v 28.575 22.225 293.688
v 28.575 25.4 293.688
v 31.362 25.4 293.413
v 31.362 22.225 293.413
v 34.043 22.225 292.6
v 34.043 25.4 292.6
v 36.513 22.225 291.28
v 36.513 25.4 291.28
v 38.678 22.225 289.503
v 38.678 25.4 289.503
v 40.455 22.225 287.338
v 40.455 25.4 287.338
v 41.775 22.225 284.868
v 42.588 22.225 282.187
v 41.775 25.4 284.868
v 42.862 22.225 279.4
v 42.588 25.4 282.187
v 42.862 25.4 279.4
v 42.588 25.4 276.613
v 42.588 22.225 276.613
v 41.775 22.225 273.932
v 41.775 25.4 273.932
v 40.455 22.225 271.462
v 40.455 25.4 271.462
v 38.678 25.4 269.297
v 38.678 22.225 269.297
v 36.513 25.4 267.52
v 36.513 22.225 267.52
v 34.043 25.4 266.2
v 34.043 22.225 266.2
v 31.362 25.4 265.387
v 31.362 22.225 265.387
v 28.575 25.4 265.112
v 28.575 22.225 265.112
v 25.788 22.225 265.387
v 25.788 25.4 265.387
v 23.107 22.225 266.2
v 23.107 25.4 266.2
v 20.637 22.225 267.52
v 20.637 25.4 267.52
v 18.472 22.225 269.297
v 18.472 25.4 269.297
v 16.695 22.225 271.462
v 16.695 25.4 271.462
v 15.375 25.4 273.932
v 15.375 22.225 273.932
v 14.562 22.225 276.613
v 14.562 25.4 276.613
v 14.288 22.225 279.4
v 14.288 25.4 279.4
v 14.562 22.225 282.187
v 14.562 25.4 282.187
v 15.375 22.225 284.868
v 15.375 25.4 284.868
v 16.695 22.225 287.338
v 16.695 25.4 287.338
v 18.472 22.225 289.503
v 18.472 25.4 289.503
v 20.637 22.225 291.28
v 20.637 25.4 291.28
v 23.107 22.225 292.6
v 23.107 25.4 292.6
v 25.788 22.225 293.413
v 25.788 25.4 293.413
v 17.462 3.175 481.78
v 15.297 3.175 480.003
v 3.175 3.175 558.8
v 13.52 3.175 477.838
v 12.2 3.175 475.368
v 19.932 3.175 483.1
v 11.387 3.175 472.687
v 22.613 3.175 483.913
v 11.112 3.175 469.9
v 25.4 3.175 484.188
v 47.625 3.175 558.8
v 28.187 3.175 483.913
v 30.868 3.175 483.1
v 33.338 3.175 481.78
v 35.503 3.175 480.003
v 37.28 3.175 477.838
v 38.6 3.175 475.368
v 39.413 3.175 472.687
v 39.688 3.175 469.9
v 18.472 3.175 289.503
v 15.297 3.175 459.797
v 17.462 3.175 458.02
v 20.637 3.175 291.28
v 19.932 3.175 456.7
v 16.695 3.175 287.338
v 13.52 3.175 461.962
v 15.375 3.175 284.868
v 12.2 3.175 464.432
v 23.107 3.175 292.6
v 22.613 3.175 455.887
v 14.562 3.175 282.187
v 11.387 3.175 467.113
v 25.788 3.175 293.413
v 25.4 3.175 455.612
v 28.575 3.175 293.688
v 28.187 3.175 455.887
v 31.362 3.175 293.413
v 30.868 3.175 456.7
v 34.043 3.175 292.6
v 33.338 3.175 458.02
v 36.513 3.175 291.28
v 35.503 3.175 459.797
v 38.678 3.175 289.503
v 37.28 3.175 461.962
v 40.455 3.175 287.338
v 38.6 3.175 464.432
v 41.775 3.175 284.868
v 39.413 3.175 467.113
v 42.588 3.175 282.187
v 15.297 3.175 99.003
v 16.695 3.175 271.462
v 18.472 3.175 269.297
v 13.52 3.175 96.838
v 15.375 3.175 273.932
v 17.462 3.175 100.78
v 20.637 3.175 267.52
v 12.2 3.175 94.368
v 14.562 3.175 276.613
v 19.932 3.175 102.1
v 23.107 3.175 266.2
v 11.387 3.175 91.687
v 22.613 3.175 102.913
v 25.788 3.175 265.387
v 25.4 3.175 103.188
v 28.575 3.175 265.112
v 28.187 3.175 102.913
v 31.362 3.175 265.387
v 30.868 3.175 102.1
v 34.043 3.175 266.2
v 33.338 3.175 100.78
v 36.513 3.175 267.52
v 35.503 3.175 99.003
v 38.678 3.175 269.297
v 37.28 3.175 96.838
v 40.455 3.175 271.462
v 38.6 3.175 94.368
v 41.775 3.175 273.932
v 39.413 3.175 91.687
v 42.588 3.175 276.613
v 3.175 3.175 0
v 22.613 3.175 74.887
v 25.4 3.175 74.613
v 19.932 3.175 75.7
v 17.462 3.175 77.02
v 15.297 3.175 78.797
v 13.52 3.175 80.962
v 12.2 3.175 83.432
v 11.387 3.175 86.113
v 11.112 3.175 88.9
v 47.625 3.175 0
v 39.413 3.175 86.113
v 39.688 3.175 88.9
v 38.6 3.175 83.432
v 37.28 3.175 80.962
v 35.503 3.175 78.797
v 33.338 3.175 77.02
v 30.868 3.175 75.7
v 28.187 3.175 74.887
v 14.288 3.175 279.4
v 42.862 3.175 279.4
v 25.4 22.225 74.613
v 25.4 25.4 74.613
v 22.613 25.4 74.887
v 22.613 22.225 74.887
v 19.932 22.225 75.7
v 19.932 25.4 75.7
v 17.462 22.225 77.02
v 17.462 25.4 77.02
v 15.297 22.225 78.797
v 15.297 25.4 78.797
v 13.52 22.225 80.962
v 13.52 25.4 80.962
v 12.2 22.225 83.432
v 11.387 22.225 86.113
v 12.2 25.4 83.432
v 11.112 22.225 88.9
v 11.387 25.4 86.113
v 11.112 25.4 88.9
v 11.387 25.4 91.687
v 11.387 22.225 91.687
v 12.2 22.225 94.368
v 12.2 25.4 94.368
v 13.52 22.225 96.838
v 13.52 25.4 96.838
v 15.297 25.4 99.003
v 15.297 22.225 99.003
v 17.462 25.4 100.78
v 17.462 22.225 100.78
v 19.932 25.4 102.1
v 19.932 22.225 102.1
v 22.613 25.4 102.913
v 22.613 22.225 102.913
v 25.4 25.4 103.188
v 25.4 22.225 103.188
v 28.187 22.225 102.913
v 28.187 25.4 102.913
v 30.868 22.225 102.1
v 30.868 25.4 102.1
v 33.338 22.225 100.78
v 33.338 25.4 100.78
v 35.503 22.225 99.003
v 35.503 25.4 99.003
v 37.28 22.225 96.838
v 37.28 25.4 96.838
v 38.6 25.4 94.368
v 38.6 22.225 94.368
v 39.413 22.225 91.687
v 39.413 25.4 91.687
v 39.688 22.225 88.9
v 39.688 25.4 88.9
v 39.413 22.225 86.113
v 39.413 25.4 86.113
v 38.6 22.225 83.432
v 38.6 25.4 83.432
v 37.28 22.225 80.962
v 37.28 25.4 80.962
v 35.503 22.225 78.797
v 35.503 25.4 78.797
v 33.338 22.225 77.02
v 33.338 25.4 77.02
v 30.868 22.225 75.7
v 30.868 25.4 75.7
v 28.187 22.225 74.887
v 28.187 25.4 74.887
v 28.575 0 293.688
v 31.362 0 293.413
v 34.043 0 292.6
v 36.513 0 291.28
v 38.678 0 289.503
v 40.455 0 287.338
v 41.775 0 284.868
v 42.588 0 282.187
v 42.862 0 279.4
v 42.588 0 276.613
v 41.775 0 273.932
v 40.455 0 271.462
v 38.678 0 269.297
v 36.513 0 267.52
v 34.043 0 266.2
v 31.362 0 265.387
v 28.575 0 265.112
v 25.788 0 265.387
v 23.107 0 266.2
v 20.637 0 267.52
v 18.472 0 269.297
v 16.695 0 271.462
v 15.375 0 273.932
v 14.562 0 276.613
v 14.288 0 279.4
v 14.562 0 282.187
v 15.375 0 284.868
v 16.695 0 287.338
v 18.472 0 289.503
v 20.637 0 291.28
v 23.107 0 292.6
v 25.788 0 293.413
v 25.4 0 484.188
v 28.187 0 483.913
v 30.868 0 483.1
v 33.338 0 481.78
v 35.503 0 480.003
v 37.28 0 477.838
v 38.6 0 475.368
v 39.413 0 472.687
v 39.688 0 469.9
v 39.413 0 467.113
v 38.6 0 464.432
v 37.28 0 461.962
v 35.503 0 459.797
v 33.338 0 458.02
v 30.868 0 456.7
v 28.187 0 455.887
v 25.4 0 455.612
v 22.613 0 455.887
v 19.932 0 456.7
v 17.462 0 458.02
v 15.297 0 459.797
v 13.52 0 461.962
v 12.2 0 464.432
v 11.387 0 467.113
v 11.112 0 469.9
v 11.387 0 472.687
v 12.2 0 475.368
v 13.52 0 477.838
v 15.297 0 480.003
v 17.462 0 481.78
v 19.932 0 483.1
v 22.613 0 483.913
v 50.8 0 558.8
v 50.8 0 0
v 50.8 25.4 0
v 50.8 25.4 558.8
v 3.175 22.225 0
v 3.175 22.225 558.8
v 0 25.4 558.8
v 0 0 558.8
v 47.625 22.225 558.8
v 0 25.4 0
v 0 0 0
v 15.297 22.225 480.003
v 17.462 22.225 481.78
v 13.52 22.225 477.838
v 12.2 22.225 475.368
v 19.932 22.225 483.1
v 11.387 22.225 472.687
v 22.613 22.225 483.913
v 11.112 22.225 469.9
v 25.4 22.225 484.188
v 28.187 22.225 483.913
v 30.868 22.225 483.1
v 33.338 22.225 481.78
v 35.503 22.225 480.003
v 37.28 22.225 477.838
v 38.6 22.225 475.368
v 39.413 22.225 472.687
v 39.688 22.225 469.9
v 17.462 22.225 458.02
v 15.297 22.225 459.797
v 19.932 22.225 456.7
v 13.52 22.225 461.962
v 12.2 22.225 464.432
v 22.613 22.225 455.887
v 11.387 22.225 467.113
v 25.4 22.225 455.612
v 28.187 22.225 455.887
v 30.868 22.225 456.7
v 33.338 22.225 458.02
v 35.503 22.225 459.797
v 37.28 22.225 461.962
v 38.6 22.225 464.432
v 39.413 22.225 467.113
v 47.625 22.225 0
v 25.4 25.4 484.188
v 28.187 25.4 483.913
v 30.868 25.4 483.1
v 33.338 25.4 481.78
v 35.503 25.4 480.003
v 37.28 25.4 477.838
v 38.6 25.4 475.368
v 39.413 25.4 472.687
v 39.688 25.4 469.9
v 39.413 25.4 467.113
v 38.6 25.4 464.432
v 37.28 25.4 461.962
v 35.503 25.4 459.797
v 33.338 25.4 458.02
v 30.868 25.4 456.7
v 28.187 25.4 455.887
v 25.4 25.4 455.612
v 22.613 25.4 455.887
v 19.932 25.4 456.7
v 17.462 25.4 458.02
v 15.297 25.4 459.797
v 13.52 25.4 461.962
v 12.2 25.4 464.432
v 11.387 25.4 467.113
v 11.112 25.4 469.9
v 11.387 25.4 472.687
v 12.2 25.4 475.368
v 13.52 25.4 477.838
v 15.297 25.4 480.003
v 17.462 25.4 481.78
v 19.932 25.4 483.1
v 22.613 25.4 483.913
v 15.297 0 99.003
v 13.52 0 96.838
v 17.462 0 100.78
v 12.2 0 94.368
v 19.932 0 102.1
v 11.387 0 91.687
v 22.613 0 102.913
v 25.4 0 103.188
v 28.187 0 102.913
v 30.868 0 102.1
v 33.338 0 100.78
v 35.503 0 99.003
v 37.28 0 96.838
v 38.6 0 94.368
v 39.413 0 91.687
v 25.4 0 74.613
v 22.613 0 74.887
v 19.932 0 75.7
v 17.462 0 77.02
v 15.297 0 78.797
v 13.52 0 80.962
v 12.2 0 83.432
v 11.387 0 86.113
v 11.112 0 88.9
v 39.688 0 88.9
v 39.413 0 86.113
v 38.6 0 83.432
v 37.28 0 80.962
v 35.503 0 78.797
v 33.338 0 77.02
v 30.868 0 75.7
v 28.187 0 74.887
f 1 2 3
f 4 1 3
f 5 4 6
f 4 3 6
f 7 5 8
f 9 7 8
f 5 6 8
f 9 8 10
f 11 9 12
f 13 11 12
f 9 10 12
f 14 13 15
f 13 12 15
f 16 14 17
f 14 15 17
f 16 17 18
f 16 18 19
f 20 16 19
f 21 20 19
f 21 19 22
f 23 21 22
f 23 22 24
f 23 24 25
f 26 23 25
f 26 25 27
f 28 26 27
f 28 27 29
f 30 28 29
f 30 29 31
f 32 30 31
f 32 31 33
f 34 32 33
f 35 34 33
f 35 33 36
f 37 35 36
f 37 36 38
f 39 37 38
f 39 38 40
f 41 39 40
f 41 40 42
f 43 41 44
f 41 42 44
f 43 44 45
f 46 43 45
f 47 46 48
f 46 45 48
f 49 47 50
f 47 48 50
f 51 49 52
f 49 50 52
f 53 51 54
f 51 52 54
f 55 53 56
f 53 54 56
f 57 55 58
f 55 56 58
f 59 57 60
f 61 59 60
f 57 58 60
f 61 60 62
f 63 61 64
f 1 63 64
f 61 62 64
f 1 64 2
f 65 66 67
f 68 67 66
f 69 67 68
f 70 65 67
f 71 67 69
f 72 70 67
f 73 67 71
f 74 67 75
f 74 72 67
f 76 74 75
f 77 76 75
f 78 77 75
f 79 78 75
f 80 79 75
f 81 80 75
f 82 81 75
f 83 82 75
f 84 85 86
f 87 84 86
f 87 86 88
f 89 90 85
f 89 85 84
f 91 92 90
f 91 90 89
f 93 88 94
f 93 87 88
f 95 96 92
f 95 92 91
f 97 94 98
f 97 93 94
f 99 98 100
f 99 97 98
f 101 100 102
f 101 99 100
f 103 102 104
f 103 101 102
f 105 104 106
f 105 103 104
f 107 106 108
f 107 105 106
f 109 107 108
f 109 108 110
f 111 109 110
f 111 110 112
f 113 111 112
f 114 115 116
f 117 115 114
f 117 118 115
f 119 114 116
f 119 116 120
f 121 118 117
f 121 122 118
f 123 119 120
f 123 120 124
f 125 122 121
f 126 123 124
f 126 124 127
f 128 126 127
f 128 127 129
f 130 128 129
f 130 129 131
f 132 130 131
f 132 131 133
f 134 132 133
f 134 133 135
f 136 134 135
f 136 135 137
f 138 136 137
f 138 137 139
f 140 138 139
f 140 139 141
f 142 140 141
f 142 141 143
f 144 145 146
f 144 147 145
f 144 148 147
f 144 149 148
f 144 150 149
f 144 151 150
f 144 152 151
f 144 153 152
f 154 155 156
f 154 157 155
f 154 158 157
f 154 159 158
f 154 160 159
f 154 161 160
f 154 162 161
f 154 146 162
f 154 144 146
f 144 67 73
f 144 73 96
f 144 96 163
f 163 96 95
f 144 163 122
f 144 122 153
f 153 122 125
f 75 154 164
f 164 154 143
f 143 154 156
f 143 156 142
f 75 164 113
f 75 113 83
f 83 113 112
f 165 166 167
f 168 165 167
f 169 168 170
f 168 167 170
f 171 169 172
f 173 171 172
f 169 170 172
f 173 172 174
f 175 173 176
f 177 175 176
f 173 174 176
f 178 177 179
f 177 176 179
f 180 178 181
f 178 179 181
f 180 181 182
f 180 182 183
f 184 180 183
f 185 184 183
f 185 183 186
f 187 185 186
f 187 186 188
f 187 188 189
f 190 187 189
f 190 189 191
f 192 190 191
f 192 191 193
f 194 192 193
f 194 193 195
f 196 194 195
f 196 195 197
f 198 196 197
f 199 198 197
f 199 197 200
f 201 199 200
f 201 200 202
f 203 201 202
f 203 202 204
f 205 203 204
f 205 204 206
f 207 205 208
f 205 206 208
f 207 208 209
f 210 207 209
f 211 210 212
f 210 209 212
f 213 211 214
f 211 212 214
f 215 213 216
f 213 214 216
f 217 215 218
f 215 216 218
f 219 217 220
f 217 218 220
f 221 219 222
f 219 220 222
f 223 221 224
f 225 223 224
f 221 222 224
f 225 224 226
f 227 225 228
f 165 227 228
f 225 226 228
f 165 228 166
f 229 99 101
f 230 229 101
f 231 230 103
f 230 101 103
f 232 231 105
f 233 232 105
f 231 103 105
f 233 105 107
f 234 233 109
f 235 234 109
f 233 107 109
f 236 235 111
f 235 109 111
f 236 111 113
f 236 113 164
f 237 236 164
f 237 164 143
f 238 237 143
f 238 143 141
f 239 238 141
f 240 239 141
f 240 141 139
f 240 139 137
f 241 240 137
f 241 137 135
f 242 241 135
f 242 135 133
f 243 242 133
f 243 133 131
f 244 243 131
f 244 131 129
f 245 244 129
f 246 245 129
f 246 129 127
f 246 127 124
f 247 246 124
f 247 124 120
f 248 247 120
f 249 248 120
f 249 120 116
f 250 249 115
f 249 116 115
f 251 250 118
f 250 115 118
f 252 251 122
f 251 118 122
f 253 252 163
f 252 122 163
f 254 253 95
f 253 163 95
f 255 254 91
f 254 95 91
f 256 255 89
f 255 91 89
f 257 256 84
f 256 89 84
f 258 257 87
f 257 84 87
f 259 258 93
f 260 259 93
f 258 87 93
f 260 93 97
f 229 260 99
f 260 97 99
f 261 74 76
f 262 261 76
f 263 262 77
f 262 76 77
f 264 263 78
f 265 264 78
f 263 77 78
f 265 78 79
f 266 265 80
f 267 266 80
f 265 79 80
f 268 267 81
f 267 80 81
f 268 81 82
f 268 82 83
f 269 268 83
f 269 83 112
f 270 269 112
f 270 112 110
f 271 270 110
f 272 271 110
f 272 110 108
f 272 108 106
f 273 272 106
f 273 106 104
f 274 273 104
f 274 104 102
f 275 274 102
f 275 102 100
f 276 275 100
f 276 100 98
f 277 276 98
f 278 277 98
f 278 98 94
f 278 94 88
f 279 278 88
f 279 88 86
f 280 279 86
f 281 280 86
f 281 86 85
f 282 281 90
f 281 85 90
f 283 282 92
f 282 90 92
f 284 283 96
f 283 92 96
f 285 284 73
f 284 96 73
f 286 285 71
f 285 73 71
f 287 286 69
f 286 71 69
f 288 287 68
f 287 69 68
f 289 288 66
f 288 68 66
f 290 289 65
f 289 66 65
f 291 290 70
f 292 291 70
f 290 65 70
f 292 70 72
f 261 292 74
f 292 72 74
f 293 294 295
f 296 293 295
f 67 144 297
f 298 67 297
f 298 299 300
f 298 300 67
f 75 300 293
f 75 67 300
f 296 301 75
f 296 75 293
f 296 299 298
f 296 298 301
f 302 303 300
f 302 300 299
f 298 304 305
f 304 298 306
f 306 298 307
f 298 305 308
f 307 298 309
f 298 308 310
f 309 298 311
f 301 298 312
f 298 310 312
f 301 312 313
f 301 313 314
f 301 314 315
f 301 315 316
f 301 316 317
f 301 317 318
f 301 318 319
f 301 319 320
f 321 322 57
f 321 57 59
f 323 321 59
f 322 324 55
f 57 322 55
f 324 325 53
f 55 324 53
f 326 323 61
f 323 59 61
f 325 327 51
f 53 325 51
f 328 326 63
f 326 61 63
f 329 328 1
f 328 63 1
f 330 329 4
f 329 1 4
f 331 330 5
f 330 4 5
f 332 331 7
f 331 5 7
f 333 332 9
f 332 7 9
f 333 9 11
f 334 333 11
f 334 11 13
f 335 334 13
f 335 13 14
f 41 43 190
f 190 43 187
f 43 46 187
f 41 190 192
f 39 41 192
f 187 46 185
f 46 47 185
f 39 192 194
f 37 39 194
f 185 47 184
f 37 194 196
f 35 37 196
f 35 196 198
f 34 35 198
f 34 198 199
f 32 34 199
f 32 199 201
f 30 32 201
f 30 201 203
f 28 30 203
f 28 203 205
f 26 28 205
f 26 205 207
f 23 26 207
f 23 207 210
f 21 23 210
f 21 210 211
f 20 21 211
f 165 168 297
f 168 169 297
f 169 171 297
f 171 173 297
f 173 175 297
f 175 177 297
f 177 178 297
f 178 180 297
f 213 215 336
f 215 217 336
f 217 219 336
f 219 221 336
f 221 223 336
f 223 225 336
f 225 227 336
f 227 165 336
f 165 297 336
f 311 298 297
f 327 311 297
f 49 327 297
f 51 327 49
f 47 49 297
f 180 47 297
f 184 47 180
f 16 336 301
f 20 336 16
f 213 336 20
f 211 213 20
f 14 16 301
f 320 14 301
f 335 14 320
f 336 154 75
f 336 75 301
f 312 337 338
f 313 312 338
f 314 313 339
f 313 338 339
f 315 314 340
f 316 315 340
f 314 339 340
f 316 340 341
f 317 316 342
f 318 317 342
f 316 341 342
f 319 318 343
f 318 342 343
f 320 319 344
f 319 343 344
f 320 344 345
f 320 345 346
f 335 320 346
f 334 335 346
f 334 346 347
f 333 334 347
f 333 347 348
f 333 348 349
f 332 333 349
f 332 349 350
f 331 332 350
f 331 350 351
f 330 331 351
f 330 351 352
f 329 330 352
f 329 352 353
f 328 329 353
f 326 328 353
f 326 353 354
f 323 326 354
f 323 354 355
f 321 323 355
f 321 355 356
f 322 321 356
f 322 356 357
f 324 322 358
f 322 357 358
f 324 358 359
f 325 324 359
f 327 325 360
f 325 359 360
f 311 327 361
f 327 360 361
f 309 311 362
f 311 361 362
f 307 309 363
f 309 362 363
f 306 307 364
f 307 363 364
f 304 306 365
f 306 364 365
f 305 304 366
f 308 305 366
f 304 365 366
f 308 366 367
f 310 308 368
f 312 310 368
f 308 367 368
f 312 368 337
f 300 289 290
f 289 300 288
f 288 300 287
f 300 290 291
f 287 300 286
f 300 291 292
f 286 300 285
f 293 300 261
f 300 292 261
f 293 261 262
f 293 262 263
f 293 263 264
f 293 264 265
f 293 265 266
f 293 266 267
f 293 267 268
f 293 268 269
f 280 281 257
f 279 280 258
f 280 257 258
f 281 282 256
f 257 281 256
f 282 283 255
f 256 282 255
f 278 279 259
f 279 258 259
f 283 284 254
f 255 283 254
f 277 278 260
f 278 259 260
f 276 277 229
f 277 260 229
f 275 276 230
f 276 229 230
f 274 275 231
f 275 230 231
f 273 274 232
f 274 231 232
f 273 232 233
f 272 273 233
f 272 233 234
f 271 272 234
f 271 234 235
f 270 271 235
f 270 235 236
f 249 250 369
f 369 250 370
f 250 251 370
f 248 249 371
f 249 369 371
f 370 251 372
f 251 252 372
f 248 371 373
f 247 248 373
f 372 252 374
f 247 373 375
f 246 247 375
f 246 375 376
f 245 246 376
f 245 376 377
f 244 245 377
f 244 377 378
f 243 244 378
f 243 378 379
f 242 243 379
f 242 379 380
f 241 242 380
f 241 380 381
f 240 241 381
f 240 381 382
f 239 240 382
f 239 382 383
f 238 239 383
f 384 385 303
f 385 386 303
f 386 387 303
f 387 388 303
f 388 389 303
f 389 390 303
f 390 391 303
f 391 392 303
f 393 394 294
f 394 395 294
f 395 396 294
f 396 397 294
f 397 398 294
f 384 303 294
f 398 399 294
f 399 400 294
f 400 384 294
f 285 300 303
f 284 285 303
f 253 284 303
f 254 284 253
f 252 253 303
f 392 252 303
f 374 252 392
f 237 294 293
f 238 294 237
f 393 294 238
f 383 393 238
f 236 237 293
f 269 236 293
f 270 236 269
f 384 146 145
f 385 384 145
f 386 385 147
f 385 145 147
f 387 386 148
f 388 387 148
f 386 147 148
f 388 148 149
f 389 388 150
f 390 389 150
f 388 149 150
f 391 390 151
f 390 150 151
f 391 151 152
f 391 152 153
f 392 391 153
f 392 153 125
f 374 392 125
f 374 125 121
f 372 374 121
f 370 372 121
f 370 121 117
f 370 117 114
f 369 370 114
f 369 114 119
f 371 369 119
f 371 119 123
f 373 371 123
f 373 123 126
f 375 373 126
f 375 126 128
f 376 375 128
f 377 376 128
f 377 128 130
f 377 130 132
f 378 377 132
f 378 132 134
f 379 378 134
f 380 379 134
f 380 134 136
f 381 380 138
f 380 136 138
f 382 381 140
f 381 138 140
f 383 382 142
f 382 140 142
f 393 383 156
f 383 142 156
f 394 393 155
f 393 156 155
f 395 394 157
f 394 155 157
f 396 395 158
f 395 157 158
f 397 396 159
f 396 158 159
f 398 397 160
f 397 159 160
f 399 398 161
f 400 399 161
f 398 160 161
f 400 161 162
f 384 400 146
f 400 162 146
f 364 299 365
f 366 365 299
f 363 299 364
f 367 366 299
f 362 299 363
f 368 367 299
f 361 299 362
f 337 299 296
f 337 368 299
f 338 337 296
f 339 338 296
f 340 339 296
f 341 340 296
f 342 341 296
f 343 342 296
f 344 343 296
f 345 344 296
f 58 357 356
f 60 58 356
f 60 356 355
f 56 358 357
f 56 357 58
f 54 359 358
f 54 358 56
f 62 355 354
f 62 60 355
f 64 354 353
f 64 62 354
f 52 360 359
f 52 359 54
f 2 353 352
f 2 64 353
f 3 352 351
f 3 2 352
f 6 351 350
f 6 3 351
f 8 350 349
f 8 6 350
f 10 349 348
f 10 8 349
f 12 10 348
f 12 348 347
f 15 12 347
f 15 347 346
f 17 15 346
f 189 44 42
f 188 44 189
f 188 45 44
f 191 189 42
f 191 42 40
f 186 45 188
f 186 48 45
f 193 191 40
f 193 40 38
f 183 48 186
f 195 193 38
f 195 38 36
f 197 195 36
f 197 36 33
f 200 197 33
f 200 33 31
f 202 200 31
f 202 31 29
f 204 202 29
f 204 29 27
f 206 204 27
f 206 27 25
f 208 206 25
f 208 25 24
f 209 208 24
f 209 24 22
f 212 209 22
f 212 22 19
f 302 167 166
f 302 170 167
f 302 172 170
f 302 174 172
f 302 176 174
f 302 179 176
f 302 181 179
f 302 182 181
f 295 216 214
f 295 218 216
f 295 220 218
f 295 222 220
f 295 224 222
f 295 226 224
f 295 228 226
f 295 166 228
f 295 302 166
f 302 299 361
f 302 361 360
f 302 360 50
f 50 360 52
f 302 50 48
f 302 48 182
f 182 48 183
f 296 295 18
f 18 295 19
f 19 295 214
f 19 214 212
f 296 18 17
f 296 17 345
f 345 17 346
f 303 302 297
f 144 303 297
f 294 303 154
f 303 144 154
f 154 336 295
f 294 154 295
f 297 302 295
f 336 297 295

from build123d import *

# Parameters (mm, degrees)
SKETCH1_W           = 50.8
SKETCH1_H           = 25.4
SKETCH1_W_2         = 44.45
SKETCH1_H_2         = 19.05
BOSS_EXTRUDE1_DEPTH = 558.8
SKETCH2_R           = 14.2875
CUT_EXTRUDE1_DEPTH  = 562.678947442


with BuildPart() as part:
    # Sketch1 → Boss-Extrude1 (new body)
    with BuildSketch(Plane.XY):
        with Locations((25.4, 12.7)):
            Rectangle(SKETCH1_W, SKETCH1_H)
        with Locations((25.4, 12.7)):
            Rectangle(SKETCH1_W_2, SKETCH1_H_2, mode=Mode.SUBTRACT)
    extrude(amount=BOSS_EXTRUDE1_DEPTH)

    # Sketch2 → Cut-Extrude1 (cut, through all)
    with BuildSketch(Plane(origin=(0, 25.4, 0), x_dir=(1, 0, 0), z_dir=(0, 1, 0))):
        with Locations(Location((28.575, -279.4, 0), (0, 0, 270))):
            Circle(SKETCH2_R)
        with Locations(Location((25.4, -469.9, 0), (0, 0, 270))):
            Circle(SKETCH2_R)
        with Locations(Location((25.4, -88.9, 0), (0, 0, 90))):
            Circle(SKETCH2_R)
    extrude(amount=-CUT_EXTRUDE1_DEPTH, mode=Mode.SUBTRACT)


solid = part.part
